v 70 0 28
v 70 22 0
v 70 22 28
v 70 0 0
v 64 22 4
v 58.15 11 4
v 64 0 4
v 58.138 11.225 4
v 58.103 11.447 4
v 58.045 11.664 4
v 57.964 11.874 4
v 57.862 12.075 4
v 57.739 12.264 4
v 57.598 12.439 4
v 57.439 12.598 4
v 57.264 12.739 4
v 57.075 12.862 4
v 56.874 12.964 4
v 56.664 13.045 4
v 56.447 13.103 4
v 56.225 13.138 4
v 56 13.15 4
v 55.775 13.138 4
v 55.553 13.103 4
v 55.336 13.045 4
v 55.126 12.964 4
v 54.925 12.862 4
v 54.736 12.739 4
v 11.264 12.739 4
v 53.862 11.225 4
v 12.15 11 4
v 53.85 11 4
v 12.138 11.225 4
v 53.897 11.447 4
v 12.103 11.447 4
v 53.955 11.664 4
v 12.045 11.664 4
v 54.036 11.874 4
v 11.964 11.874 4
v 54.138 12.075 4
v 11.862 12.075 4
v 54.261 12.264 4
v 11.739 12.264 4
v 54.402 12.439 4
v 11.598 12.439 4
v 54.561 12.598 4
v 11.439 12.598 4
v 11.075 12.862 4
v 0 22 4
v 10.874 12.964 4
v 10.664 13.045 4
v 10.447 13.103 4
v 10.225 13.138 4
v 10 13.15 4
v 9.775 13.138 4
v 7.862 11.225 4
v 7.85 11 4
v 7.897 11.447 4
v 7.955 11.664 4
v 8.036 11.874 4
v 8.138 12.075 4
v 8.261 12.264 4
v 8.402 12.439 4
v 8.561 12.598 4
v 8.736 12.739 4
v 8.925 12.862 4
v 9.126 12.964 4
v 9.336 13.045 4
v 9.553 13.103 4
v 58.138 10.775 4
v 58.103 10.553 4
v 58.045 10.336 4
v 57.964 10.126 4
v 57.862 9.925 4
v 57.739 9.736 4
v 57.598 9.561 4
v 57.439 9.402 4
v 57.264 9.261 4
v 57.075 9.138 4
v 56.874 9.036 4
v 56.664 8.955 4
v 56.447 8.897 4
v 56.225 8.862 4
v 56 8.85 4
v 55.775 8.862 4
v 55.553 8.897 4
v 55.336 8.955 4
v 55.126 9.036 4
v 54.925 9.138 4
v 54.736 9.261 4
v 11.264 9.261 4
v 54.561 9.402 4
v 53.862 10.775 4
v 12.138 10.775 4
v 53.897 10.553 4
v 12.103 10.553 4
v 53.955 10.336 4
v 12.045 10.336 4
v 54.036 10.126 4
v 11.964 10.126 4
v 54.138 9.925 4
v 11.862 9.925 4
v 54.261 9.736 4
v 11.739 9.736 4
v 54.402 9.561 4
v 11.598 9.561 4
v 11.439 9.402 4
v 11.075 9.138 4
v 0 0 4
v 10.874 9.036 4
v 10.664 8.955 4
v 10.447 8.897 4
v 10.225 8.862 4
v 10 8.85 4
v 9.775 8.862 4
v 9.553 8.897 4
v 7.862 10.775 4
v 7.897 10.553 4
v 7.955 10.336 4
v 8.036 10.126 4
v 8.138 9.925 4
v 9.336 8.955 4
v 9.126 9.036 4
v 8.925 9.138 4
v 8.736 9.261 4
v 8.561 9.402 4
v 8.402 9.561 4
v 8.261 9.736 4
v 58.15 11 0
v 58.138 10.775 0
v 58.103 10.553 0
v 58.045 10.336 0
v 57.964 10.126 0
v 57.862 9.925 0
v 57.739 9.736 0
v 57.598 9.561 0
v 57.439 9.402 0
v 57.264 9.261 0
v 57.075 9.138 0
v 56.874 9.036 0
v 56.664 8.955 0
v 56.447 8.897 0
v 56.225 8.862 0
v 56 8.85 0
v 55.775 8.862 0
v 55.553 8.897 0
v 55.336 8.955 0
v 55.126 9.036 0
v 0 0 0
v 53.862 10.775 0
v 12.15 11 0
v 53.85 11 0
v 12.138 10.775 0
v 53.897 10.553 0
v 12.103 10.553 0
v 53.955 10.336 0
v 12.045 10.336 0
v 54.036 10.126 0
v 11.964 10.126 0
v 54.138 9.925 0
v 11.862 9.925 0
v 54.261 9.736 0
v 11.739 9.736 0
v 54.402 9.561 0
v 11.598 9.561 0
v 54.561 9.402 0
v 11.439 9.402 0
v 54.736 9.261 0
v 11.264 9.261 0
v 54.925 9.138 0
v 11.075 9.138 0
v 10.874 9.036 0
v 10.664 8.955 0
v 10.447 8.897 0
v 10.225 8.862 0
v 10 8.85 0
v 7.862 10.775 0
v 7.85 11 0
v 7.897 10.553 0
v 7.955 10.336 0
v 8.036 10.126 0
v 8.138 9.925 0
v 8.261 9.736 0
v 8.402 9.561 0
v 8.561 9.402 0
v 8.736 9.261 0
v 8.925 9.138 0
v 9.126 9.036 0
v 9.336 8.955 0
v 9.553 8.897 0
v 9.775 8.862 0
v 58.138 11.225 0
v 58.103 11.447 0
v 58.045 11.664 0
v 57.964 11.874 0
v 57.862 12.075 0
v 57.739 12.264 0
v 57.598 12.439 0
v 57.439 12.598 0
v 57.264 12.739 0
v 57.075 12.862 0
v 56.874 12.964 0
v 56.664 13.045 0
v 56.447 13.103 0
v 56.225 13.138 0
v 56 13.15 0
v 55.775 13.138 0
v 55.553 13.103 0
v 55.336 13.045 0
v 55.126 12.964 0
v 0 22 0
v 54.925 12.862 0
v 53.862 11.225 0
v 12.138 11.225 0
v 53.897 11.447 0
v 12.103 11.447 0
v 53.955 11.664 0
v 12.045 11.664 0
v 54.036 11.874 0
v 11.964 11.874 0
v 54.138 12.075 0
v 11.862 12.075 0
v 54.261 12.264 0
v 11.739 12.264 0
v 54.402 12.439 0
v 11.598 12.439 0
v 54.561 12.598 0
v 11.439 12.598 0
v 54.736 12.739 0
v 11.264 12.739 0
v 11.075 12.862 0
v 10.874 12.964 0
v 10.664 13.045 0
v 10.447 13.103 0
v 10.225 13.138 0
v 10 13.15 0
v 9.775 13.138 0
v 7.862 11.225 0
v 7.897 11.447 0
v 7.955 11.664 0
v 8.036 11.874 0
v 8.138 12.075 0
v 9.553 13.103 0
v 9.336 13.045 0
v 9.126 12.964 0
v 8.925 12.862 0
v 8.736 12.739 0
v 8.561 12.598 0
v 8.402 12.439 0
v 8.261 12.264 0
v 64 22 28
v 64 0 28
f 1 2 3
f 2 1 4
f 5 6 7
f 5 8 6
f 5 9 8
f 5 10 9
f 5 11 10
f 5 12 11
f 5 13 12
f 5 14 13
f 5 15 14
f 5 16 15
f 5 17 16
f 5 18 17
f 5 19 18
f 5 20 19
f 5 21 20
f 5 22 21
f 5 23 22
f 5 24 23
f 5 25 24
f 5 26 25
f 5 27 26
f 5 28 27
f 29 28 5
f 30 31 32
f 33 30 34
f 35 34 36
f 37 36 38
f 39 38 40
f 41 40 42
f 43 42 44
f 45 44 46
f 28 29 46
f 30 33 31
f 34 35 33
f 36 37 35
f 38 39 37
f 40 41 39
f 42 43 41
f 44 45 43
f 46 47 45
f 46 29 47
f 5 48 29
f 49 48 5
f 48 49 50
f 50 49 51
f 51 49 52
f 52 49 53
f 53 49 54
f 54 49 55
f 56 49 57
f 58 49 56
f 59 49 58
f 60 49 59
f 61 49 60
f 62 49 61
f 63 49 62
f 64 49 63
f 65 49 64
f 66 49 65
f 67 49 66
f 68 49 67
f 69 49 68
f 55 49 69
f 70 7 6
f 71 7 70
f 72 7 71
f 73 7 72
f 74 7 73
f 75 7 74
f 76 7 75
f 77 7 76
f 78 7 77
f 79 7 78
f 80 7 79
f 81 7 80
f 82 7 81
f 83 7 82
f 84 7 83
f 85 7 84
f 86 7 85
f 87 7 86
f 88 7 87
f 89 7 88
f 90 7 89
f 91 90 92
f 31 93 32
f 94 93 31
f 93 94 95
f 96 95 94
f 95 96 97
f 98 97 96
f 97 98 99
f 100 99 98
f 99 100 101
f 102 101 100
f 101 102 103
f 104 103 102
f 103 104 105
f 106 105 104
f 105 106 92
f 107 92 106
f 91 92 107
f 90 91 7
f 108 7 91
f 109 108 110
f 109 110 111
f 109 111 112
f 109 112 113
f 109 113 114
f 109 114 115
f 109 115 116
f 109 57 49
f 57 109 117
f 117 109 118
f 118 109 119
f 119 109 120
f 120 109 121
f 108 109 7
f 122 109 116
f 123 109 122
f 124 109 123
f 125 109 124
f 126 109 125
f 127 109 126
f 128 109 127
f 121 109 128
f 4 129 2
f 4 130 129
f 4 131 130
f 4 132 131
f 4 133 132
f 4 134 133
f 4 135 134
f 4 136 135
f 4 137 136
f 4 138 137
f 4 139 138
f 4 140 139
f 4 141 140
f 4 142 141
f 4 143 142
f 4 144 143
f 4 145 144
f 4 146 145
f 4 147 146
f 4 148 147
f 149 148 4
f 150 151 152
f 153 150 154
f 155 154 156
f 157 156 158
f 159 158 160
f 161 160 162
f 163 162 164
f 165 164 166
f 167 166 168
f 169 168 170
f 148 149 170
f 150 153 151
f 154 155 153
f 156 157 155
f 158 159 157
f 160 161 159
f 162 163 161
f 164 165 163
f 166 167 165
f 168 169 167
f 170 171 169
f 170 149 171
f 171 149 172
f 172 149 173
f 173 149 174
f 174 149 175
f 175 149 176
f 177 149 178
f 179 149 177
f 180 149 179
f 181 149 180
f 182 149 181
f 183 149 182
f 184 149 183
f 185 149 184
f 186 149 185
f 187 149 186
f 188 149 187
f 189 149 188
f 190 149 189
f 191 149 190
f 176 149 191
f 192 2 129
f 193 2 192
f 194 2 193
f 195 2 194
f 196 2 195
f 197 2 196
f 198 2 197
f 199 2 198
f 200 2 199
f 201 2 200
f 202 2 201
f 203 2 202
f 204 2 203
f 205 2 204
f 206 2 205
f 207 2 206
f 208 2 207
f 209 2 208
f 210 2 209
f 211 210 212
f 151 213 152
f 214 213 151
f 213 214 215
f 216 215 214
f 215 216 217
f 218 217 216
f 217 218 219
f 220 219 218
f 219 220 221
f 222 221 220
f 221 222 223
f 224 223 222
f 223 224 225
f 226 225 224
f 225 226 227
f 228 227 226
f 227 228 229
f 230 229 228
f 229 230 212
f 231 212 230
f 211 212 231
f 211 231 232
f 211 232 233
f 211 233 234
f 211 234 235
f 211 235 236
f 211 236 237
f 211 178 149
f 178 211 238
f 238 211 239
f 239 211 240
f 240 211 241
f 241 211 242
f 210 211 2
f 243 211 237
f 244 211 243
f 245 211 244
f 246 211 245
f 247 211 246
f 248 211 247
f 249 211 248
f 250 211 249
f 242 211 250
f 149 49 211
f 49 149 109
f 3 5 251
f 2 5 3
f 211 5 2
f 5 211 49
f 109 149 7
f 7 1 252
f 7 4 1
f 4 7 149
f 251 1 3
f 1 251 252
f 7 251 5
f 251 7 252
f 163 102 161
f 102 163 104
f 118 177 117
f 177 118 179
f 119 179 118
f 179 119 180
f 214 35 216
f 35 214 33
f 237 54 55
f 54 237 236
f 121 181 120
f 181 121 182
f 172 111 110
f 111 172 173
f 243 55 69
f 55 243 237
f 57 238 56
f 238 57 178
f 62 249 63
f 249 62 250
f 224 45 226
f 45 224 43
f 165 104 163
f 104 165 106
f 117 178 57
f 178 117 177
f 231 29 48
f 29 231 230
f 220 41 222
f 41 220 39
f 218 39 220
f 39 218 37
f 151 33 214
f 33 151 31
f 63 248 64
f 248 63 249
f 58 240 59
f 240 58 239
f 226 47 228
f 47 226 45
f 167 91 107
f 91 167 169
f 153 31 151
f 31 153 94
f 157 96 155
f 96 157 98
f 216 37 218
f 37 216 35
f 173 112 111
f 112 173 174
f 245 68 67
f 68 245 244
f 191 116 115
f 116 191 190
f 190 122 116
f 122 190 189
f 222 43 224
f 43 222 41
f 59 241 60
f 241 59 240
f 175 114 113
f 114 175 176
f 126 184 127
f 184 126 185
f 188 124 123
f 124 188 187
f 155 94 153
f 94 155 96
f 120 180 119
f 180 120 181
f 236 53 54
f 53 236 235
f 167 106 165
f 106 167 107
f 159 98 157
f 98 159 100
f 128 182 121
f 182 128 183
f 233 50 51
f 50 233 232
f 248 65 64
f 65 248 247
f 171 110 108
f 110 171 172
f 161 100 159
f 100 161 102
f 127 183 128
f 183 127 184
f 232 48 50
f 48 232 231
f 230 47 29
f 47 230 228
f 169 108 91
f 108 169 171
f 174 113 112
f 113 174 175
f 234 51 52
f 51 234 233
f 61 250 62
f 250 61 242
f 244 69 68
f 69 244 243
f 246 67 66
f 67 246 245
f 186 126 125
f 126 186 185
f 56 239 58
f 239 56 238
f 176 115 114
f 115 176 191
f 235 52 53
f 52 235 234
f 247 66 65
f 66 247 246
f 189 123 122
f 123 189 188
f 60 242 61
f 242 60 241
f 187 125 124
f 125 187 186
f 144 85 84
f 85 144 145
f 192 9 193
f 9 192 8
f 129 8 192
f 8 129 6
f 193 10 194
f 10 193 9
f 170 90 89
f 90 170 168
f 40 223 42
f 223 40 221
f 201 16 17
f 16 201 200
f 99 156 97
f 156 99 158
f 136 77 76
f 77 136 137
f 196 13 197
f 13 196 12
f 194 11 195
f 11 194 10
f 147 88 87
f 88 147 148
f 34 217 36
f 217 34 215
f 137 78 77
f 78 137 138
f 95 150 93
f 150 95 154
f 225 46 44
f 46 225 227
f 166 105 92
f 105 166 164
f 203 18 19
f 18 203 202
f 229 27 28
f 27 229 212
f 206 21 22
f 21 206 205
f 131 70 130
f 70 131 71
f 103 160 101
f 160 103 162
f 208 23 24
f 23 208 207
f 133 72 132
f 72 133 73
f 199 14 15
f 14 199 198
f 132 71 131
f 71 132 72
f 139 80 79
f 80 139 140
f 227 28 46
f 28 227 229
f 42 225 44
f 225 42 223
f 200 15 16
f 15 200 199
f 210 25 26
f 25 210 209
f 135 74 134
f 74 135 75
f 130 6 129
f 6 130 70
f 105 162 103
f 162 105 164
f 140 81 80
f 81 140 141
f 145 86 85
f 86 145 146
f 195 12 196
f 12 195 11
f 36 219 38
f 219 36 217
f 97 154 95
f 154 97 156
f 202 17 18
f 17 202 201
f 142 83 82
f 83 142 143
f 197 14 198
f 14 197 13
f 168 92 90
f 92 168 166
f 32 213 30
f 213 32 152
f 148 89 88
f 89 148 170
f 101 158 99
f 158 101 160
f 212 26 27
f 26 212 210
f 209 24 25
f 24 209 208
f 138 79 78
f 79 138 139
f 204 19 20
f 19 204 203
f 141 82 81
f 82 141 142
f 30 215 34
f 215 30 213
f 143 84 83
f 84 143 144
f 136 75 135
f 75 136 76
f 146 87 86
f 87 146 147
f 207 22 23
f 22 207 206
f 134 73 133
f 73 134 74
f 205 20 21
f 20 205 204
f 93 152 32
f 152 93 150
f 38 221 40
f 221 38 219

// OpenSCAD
// Latch catch plate.
$fn = 60;
eps = 0.02;
length = 70;
height = 24;
width = 22;
thickness = 4;
difference() {
    union() { cube([length,width,thickness]); translate([length-6,0,thickness]) cube([6,width,height]); }
    for(x=[10,length-14]) translate([x,width/2,-eps]) cylinder(d=4.3,h=thickness+2*eps);
}
